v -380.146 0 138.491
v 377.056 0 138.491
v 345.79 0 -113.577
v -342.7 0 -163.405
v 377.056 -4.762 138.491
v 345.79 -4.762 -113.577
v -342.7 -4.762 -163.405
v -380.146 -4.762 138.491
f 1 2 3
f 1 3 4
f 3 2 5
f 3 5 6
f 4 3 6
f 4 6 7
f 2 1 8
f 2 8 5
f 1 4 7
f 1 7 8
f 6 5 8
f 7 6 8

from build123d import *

# Parameters (mm, degrees)
F1_DEPTH = 4.7625


# Not quite as in the source:
# - a length typed as a fraction of an inch, garbled in the dataset ("3 / 203.2 mm" for 3/8 in), is restored


with BuildPart() as f1:
    # F0 (on Front) → F1 (new body)
    with BuildSketch(Plane.XZ):
        Polygon((342.7002896502, -163.4048530862), (380.145872664, 138.4910887061), (-377.0557005115, 138.4910887061), (-345.7904618027, -113.577324326), align=None)
    extrude(amount=F1_DEPTH)


with BuildPart() as f2_1:
    # F2: instance of F1
    add(f1.part.mirror(Plane.YZ))


solid = f2_1.part
